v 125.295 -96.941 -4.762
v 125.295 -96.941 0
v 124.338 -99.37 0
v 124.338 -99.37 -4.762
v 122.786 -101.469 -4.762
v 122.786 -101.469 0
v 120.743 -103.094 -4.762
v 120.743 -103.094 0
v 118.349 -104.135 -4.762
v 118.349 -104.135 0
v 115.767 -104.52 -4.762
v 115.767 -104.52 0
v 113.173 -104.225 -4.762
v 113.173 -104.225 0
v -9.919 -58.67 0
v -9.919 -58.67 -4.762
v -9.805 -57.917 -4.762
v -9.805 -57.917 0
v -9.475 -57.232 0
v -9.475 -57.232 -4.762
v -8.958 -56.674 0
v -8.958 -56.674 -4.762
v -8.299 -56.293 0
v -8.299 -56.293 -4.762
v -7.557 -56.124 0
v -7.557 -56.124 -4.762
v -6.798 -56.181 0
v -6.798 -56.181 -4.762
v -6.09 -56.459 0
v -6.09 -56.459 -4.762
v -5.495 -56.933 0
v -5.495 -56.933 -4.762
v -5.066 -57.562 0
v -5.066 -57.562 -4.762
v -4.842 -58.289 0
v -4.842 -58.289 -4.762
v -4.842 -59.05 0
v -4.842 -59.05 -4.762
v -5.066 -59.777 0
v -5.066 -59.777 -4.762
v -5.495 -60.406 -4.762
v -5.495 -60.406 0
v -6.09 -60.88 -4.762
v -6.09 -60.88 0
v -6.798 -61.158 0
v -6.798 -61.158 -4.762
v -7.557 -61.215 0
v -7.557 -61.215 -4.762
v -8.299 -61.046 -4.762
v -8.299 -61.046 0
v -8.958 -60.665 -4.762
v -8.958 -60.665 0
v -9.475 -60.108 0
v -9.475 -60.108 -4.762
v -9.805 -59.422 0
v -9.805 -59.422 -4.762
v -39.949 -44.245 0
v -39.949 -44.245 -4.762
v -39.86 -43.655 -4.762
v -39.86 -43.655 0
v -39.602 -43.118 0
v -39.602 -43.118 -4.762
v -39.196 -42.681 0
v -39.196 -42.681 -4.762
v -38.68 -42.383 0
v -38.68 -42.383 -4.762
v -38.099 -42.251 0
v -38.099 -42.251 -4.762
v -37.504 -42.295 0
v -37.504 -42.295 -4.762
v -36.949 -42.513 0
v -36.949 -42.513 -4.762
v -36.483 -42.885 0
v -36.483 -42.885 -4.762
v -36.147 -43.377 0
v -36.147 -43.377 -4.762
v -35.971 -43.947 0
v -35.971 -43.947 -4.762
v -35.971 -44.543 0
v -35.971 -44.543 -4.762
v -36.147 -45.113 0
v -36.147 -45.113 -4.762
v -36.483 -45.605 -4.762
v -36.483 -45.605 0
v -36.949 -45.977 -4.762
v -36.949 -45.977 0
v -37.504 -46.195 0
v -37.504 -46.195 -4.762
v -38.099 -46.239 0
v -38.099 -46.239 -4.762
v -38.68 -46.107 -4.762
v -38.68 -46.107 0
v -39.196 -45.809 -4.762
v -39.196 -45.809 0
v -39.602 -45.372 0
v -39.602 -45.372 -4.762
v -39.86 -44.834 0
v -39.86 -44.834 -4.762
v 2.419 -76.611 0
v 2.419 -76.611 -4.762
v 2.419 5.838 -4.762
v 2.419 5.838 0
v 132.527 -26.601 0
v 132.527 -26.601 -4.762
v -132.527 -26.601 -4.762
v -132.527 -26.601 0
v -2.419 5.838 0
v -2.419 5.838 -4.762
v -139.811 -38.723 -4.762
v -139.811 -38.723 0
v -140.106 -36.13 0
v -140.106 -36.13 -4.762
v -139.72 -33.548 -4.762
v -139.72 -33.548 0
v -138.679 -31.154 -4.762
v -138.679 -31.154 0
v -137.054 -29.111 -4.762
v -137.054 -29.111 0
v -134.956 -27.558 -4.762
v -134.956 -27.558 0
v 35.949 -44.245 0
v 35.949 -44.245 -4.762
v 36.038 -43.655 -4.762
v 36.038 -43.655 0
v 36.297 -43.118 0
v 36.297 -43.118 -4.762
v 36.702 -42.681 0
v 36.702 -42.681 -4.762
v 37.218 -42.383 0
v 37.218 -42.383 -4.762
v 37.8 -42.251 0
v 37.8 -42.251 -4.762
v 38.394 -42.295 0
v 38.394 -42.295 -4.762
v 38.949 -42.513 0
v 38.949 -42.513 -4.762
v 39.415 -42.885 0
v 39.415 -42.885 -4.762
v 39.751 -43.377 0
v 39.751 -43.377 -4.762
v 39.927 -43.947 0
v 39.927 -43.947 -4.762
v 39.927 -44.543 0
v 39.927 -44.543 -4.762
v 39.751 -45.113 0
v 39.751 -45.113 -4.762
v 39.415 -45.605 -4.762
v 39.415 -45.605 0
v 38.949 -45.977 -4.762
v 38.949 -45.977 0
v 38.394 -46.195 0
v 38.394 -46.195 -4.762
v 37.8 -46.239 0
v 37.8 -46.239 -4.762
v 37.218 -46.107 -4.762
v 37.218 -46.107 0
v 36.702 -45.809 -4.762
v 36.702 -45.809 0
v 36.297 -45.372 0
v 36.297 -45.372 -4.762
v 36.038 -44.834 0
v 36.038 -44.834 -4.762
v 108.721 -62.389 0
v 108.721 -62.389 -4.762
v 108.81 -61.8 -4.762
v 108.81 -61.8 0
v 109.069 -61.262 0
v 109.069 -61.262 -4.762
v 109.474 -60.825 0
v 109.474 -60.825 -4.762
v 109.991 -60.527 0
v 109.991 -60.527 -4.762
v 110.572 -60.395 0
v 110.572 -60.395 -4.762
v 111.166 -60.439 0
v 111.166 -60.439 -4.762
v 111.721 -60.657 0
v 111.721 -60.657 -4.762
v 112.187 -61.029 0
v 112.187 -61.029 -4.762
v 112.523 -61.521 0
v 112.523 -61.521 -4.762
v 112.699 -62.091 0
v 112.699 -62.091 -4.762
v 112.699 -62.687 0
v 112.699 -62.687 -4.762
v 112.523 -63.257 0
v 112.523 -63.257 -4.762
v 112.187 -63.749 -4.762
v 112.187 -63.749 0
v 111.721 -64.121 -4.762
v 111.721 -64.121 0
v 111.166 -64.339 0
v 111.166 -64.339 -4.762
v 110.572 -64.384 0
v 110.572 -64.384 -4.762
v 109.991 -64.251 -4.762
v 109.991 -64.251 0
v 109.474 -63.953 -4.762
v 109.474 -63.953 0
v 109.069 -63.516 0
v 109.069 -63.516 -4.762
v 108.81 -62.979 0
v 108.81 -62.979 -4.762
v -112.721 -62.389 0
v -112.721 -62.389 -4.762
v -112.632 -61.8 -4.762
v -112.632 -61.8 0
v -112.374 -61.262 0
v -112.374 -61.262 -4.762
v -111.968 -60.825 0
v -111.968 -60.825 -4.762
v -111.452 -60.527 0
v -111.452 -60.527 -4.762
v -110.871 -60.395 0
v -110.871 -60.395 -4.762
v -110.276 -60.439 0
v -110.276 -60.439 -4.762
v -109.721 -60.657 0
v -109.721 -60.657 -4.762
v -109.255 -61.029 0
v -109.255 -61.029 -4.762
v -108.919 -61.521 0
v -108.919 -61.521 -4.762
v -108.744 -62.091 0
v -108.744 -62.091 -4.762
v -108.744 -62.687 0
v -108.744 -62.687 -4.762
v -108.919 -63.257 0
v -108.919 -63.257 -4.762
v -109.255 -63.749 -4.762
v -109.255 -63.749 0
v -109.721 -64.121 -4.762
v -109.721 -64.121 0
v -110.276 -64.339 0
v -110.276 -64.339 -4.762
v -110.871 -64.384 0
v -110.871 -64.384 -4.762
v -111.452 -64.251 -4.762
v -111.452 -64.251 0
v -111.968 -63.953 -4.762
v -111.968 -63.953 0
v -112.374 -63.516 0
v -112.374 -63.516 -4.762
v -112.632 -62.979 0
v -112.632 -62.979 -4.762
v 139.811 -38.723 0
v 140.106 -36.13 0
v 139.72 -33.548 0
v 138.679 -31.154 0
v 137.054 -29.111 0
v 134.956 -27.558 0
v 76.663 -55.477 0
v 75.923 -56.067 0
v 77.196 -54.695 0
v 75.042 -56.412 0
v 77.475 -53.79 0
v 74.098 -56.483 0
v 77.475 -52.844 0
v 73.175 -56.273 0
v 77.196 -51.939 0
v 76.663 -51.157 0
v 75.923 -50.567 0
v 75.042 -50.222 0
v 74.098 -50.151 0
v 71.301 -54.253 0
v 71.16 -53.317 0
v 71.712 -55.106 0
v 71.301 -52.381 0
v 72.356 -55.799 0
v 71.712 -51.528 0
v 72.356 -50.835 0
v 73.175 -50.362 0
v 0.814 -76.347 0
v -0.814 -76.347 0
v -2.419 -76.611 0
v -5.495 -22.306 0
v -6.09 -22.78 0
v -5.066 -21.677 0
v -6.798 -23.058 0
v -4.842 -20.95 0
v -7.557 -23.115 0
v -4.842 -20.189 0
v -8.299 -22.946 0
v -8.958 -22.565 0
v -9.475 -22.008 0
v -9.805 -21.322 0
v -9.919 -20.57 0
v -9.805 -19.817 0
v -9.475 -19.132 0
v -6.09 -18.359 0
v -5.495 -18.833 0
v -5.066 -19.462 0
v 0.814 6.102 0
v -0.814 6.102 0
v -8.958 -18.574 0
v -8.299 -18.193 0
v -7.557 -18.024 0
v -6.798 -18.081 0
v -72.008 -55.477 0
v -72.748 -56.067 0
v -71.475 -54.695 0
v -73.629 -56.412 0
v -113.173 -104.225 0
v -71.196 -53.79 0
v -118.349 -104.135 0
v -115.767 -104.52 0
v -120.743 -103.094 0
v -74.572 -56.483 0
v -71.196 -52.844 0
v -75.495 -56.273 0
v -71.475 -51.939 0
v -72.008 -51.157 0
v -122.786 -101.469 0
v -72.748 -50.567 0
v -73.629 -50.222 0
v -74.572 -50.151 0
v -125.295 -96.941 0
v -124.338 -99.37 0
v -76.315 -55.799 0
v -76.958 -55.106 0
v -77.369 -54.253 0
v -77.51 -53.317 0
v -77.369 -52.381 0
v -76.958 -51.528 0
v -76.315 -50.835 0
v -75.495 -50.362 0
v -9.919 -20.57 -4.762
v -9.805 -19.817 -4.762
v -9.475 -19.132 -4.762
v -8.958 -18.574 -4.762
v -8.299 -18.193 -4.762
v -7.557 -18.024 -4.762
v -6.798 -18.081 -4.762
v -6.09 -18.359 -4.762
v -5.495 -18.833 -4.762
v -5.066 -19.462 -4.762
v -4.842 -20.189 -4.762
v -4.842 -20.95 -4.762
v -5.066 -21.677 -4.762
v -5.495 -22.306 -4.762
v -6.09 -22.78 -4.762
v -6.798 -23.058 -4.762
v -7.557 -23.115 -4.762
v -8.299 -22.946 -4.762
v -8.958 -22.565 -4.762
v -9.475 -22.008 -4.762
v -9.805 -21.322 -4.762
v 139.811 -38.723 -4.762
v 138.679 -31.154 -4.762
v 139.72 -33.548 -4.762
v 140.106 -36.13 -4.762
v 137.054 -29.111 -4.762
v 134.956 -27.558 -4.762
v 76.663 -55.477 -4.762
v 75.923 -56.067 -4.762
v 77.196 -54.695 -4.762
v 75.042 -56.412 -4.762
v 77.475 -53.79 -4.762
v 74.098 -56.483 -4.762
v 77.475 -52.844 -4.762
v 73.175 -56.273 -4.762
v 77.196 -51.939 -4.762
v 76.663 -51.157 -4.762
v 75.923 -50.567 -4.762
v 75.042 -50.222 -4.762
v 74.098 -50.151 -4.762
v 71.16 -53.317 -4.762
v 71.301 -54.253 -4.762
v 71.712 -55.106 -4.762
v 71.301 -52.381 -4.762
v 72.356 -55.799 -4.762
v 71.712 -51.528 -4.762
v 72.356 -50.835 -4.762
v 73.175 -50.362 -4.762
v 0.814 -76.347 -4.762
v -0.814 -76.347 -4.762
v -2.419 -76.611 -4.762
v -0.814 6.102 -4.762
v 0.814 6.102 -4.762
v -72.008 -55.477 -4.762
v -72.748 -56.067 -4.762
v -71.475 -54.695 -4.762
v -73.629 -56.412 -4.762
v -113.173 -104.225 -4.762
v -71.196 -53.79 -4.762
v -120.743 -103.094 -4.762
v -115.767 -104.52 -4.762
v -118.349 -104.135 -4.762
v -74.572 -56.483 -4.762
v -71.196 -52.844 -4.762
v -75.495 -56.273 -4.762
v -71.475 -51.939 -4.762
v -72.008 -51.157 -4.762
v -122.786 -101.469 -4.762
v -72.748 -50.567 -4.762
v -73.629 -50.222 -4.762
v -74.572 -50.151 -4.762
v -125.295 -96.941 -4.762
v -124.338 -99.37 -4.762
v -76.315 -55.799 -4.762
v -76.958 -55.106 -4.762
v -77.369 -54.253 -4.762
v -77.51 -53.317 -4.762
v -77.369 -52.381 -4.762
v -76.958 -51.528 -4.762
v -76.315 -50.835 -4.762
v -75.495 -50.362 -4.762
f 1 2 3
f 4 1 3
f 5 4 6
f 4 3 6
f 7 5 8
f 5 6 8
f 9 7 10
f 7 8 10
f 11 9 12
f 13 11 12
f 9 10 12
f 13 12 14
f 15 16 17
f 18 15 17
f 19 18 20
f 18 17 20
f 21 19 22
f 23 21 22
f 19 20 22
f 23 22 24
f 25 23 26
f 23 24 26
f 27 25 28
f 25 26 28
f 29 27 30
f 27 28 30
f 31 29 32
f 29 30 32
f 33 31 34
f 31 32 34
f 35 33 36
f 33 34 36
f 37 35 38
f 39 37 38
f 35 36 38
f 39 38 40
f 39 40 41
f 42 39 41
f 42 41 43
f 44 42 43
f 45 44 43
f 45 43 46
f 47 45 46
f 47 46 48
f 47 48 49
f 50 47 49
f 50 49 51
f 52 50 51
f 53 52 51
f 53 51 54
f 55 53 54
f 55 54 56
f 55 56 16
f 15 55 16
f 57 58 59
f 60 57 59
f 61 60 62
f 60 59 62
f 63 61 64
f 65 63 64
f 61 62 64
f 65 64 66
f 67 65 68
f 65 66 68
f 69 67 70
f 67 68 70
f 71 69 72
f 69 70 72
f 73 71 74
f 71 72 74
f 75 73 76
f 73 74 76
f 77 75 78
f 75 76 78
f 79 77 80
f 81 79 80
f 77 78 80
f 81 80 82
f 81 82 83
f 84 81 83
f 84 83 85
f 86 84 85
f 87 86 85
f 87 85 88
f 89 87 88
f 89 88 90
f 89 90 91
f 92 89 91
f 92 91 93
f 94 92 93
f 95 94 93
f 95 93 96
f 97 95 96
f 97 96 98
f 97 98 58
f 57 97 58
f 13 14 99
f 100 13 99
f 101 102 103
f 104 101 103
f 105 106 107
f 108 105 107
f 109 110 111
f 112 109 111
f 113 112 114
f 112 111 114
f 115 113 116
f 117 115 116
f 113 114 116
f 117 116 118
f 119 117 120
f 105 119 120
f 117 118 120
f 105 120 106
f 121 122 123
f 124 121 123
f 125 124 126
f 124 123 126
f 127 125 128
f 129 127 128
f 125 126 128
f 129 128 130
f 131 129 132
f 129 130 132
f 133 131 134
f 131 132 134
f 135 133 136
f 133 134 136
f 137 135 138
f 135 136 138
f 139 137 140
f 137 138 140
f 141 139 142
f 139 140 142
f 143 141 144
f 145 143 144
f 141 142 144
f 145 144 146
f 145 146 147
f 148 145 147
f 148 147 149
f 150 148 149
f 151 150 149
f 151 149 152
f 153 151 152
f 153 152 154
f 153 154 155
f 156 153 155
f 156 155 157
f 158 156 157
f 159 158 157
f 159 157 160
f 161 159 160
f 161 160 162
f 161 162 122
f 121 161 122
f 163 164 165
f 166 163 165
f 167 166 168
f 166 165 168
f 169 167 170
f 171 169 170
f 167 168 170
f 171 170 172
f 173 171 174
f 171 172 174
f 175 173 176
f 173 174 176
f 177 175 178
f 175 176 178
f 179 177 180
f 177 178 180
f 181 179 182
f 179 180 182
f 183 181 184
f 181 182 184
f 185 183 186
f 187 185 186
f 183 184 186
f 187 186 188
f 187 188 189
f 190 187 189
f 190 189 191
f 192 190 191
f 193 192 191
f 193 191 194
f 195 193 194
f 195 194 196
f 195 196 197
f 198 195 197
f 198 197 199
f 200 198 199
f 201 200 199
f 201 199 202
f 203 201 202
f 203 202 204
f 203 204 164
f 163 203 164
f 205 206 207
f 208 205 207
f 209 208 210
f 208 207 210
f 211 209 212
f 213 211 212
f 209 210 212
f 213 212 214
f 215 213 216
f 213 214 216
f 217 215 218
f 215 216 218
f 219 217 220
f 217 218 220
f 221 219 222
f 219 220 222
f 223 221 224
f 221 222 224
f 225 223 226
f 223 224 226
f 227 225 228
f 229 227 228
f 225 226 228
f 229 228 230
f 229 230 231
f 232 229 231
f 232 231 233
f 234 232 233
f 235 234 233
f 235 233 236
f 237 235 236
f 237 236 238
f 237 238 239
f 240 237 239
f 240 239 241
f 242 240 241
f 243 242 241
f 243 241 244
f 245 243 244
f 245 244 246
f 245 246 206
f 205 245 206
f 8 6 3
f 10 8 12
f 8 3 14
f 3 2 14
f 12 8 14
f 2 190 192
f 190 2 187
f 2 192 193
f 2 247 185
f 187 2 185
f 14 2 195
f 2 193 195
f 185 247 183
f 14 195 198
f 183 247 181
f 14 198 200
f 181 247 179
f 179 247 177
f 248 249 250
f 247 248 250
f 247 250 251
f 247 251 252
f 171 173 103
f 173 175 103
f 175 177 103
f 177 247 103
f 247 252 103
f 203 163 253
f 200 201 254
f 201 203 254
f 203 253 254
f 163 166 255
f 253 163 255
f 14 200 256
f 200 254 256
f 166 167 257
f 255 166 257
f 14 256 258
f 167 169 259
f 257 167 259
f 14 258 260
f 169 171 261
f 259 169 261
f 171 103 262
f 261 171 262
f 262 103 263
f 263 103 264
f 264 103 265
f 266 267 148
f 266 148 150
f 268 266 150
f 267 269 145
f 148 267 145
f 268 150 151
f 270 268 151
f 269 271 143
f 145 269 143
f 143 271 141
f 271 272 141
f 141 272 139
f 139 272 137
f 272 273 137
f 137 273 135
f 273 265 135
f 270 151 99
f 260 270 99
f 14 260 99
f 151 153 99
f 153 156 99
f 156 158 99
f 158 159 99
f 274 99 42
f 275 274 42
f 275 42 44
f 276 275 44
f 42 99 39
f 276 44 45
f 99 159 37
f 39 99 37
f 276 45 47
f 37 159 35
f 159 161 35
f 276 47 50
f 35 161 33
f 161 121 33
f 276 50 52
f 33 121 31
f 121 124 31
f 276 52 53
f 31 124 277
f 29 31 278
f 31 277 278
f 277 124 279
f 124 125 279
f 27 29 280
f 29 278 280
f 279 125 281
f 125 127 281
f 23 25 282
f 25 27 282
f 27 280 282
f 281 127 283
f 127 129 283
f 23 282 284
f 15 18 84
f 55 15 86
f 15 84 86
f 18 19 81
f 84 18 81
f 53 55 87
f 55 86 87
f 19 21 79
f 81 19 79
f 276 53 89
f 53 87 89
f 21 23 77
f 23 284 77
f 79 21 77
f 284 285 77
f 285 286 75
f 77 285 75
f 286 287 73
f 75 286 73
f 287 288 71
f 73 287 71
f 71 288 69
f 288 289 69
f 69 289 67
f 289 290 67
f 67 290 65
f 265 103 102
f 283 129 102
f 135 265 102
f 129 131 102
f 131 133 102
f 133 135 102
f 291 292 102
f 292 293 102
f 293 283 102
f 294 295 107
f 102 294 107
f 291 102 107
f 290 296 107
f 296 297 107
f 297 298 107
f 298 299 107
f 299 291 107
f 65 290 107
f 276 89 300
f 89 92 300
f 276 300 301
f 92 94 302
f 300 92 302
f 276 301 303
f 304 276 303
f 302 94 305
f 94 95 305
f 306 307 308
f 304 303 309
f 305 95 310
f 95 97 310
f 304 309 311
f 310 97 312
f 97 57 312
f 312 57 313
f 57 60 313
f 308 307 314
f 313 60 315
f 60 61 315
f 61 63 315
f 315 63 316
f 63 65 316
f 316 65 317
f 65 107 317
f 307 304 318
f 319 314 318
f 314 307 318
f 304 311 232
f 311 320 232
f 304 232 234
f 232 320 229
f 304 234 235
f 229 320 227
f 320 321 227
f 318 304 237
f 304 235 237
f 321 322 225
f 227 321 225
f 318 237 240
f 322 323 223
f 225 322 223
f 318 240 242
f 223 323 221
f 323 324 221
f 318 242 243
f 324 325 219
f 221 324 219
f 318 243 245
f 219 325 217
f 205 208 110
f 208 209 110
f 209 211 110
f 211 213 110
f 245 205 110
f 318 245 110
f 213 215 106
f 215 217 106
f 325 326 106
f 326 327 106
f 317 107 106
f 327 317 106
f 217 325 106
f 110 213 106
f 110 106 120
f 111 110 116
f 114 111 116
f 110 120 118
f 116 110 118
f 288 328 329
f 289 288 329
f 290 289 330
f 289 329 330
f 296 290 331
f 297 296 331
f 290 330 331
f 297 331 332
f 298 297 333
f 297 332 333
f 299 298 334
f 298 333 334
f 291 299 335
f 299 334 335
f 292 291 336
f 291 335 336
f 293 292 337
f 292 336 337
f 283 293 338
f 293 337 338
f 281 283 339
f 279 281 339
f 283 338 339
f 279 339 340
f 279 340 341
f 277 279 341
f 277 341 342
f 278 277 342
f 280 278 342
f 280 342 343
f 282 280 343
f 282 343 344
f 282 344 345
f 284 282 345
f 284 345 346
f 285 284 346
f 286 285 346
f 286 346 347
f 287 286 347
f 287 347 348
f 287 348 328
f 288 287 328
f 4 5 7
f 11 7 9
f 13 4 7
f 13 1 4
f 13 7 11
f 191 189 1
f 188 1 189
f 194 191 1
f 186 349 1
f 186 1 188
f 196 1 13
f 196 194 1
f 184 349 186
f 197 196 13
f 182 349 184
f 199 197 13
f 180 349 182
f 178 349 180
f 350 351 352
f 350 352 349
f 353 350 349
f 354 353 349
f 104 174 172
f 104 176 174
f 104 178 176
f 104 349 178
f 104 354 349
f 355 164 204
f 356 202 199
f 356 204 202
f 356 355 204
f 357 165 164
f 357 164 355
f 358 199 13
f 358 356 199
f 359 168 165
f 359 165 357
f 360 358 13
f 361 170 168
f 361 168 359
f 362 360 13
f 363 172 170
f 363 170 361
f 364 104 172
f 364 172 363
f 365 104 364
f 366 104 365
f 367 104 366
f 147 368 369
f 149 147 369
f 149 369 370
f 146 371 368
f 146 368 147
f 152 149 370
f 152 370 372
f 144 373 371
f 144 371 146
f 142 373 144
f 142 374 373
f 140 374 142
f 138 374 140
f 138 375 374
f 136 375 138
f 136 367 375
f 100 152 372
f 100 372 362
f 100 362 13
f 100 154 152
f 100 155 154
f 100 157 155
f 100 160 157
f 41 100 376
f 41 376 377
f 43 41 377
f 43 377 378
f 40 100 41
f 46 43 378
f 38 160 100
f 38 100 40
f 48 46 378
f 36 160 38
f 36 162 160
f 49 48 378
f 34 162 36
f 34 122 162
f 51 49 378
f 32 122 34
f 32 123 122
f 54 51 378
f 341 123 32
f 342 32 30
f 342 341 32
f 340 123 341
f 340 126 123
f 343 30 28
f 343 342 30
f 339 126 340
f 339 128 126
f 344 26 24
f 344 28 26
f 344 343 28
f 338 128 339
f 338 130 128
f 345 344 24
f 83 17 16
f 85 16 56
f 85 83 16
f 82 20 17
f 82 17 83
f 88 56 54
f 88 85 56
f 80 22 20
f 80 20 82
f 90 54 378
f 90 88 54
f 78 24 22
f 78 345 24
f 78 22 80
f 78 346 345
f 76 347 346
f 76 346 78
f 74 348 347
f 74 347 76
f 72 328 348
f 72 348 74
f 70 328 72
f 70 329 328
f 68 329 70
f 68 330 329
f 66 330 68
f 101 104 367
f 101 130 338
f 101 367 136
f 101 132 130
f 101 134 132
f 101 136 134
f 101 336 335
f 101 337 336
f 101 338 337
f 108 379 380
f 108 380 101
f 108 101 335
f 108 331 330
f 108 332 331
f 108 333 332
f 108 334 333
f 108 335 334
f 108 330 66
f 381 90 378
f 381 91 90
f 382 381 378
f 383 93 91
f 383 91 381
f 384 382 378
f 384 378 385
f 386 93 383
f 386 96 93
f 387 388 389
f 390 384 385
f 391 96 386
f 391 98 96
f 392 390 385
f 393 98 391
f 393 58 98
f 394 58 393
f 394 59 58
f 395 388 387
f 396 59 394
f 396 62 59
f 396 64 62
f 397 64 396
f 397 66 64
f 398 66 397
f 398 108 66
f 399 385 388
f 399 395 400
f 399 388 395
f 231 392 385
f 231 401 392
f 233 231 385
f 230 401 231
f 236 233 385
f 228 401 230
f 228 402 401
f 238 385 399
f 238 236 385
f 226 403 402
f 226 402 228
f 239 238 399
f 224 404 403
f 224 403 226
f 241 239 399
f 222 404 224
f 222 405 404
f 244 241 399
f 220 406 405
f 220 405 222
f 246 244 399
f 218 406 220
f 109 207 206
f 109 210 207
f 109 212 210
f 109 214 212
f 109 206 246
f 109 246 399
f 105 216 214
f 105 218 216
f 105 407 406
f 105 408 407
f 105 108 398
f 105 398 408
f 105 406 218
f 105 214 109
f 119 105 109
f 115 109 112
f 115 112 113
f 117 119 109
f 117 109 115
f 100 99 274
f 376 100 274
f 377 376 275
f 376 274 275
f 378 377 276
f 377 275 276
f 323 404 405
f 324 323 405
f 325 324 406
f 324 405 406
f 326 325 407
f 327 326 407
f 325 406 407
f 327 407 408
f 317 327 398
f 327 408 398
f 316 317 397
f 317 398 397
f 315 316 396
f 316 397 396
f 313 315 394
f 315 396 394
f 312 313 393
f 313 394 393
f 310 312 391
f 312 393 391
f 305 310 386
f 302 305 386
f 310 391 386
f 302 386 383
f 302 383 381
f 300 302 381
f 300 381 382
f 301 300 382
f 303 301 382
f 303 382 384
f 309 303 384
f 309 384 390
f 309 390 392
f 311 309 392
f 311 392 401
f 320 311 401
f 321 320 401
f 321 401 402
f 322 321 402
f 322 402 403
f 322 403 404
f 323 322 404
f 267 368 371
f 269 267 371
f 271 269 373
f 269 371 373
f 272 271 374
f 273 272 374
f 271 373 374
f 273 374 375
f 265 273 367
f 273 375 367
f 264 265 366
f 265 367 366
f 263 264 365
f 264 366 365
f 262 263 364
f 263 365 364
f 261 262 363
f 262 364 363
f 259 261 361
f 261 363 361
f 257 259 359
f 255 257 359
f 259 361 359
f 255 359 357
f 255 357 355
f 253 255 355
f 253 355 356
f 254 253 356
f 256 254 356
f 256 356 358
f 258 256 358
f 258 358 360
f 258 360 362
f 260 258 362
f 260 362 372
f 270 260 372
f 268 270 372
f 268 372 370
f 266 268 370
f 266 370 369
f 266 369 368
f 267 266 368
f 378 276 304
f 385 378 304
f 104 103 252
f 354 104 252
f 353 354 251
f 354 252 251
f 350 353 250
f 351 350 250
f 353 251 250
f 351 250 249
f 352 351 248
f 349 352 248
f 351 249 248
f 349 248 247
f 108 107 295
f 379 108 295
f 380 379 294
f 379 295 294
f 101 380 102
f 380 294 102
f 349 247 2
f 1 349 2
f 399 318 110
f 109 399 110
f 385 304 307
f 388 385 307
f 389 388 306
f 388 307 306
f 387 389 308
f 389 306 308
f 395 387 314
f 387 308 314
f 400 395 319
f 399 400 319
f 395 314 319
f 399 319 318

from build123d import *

# Parameters (mm, degrees)
BOSS_EXTRUDE1_DEPTH         = 4.7625
F_1_4_0_25_DIAMETER_HOLE2_D = 6.35
F_4_0MM_DOWEL_HOLE1_D       = 4
F_1_4_20_TAPPED_HOLE1_D     = 5.1054


with BuildPart() as part:
    # Sketch1 → Boss-Extrude1 (new body)
    with BuildSketch(Plane.XY):
        with BuildLine():
            Line((-132.526798161, -26.601306725), (-2.419218956, 5.838156153))
            ThreePointArc((-2.419218956, 5.838156153), (0, 6.13519889), (2.419218956, 5.838156153))
            Line((2.419218956, 5.838156153), (132.526798161, -26.601306725))
            ThreePointArc((132.526798161, -26.601306725), (138.679252212, -31.153883239), (139.810536468, -38.723482944))
            Line((139.810536468, -38.723482944), (125.295222732, -96.941226521))
            ThreePointArc((125.295222732, -96.941226521), (120.742646218, -103.093680572), (113.173046513, -104.224964827))
            Line((113.173046513, -104.224964827), (2.419218956, -76.610934195))
            ThreePointArc((2.419218956, -76.610934195), (0, -76.313891458), (-2.419218956, -76.610934195))
            Line((-2.419218956, -76.610934195), (-113.173046513, -104.224964827))
            ThreePointArc((-113.173046513, -104.224964827), (-120.742646218, -103.093680572), (-125.295222732, -96.941226521))
            Line((-125.295222732, -96.941226521), (-139.810536468, -38.723482944))
            ThreePointArc((-139.810536468, -38.723482944), (-138.679252212, -31.153883239), (-132.526798161, -26.601306725))
        make_face()
    extrude(amount=-BOSS_EXTRUDE1_DEPTH)

    # 1/4 (0.25) Diameter Hole2 (through all)
    with Locations(Plane.XY):
        with Locations((-74.335136024, -53.317040996), (74.335136024, -53.317040996)):
            Hole(F_1_4_0_25_DIAMETER_HOLE2_D / 2)

    # Ø4.0mm Dowel Hole1 (through all)
    with Locations(Plane.XY):
        with Locations((-110.721225759, -62.389112081), (-37.949046288, -44.244969911), (37.949046288, -44.244969911), (110.721225759, -62.389112081)):
            Hole(F_4_0MM_DOWEL_HOLE1_D / 2)

    # 1/4-20 Tapped Hole1 (through all)
    with Locations(Plane.XY):
        with Locations((-7.366, -20.569560235), (-7.366, -58.669560235)):
            Hole(F_1_4_20_TAPPED_HOLE1_D / 2)


solid = part.part
